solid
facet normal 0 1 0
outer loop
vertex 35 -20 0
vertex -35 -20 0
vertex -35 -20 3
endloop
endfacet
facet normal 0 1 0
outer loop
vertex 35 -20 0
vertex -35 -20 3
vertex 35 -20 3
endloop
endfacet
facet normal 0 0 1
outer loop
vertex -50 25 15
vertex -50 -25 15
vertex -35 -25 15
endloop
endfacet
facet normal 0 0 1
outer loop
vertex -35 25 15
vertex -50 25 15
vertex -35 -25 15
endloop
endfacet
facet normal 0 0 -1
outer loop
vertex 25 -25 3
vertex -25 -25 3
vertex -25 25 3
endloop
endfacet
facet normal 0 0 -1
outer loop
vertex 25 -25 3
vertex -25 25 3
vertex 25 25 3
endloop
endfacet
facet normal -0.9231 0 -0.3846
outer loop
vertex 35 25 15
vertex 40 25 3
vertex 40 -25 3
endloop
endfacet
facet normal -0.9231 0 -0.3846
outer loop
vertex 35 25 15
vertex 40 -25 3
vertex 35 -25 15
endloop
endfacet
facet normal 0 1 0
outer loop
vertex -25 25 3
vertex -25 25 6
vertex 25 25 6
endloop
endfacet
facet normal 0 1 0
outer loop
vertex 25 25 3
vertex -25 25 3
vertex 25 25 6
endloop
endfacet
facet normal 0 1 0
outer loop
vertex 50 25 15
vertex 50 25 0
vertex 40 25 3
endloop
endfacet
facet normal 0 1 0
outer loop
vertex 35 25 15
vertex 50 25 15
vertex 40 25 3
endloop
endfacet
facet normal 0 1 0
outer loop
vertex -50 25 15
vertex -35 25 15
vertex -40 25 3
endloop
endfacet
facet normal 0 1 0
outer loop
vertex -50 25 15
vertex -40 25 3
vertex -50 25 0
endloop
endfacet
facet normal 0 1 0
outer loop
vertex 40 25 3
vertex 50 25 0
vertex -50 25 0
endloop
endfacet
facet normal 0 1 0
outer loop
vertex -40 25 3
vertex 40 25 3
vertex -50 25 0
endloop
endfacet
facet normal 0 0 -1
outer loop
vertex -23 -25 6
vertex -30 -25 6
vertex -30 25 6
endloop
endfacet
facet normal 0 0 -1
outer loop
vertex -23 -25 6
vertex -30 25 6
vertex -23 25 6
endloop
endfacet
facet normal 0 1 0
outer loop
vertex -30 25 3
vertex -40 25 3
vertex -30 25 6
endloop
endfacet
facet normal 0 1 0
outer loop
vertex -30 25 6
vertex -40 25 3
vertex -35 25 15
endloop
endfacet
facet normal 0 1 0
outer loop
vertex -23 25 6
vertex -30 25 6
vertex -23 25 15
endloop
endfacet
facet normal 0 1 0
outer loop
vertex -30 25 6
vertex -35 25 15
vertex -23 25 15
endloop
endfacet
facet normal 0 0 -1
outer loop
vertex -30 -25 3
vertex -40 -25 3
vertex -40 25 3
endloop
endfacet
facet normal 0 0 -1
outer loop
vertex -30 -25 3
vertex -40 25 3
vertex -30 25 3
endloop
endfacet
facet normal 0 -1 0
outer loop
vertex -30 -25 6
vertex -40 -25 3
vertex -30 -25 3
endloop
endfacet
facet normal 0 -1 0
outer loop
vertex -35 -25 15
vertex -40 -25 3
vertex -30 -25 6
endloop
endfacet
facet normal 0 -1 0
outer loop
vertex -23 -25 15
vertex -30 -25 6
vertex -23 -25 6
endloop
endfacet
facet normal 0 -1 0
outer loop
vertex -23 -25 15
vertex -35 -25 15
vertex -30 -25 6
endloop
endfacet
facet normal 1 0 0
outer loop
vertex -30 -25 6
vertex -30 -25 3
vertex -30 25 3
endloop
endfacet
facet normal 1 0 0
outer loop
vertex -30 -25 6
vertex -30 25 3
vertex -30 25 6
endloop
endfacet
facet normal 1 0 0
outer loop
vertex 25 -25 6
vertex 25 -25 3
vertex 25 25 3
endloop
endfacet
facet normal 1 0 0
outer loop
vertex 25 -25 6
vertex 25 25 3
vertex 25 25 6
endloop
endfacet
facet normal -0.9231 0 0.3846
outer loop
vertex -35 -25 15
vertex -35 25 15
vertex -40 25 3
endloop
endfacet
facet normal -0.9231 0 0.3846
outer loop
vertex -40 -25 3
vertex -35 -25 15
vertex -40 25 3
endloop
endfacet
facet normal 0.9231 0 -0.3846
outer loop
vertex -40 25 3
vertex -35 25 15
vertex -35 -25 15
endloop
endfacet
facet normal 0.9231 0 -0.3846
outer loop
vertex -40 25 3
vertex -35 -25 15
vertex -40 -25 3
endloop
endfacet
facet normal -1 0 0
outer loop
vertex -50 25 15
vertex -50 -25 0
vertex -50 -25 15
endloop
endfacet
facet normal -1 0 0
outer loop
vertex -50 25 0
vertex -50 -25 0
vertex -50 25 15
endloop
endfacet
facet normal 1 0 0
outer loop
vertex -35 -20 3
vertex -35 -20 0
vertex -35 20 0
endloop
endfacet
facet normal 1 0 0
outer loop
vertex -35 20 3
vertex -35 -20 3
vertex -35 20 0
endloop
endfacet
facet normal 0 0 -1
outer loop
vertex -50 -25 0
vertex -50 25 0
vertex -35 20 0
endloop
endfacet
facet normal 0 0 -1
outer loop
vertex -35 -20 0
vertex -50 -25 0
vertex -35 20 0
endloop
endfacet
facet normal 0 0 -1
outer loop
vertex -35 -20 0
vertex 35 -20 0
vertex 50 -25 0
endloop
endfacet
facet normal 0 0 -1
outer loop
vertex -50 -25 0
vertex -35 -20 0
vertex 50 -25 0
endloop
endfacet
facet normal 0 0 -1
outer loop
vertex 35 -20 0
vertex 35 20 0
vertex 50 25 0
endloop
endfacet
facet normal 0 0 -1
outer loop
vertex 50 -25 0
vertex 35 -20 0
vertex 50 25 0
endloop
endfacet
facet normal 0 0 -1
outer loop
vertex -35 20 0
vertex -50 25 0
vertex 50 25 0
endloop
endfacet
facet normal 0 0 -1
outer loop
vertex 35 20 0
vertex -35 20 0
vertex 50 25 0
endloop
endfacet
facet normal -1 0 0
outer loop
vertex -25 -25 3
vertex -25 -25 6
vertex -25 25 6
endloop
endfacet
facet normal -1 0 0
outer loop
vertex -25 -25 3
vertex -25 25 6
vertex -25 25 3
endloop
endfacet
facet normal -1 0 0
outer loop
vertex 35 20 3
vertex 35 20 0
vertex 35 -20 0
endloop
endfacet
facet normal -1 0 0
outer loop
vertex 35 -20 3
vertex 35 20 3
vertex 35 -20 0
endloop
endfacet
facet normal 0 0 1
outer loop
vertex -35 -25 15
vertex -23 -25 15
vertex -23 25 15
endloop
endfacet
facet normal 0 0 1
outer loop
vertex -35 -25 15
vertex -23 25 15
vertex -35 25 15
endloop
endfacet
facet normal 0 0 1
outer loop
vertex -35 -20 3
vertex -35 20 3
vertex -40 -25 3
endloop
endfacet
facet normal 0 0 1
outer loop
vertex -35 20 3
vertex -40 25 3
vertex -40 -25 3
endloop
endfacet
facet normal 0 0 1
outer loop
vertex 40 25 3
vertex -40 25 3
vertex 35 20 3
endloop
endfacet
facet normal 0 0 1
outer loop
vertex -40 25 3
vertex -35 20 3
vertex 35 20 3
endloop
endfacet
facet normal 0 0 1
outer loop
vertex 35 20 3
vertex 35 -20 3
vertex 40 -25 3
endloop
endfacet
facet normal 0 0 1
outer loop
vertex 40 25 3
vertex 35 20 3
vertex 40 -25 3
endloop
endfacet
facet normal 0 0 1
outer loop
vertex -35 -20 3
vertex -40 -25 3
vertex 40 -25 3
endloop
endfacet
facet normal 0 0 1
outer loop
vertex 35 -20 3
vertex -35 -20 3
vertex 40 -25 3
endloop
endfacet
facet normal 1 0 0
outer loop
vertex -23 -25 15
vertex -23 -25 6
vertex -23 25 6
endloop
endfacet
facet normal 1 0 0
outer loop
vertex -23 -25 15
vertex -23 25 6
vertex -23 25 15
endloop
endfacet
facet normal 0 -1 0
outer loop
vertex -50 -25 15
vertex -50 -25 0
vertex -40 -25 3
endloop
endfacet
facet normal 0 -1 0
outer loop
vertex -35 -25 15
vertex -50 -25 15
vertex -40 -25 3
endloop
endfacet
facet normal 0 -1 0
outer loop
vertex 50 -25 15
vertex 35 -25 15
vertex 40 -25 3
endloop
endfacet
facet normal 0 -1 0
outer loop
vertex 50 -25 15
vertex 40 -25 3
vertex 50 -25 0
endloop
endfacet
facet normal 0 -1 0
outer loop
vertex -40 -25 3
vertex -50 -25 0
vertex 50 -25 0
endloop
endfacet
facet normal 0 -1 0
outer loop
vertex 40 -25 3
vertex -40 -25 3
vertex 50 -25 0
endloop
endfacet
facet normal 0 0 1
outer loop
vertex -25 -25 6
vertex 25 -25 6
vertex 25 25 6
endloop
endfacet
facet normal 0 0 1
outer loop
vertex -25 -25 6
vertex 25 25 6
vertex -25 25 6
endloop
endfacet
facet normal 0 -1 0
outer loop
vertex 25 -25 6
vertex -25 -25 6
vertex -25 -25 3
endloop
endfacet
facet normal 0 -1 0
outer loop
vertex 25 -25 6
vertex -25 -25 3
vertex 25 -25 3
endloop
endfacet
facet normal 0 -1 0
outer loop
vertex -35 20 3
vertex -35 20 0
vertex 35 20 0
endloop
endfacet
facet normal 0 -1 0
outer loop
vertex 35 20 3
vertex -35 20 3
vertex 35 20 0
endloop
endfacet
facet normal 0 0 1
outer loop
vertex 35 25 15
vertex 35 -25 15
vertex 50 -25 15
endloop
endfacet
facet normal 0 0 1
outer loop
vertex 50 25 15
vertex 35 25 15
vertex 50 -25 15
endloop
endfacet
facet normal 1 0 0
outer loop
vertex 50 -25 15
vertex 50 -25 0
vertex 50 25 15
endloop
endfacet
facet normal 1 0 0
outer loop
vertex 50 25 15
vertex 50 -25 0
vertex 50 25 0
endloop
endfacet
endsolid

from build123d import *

# Parameters (mm, degrees)
F0_W     = 70
F0_H     = 5
F1_DEPTH = 3
F0_W_2   = 10
F0_H_2   = 50
F2_DEPTH = 15
F4_DEPTH = 50.001
F6_DEPTH = 50
F7_DEPTH = 50


with BuildPart() as f1:
    # F0 (on Top) → F1 (new body)
    with BuildSketch(Plane.XY):
        with Locations((0, -22.5)):
            Rectangle(F0_W, F0_H)
        Polygon((-40, -25), (-35, -25), (-35, -20), (-35, 20), (-35, 25), (-40, 25), align=None)
        with Locations((0, 22.5)):
            Rectangle(F0_W, F0_H)
        Polygon((35, -25), (40, -25), (40, 25), (35, 25), (35, 20), (35, -20), align=None)
    extrude(amount=F1_DEPTH)

    # F0 (on Top) → F2 (join)
    with BuildSketch(Plane.XY):
        Polygon((-40, -25), (-35, -25), (-35, -20), (-35, 20), (-35, 25), (-40, 25), align=None)
        with Locations((-45, 0)):
            Rectangle(F0_W_2, F0_H_2)
        Polygon((35, -25), (40, -25), (40, 25), (35, 25), (35, 20), (35, -20), align=None)
        with Locations((45, 0)):
            Rectangle(F0_W_2, F0_H_2)
    extrude(amount=F2_DEPTH)

    # F3 (on face) → F4 (cut, through all)
    with BuildSketch(Plane.XZ.offset(25)):
        Polygon((-35, 3), (-35, 15), (-40, 3), align=None)
        Polygon((35, 15), (35, 3), (40, 3), align=None)
    extrude(amount=-F4_DEPTH, mode=Mode.SUBTRACT)


with BuildPart() as f6:
    # F5 (on face) → F6 (new body, through all)
    with BuildSketch(Plane.XZ.offset(25)):
        Polygon((25, 6), (-23, 6), (-25, 6), (-25, 3), (25, 3), align=None)
    extrude(amount=-F6_DEPTH)


with BuildPart() as f7:
    # F5 (on face) → F7 (new body, through all)
    with BuildSketch(Plane.XZ.offset(25)):
        Polygon((-23, 15), (-35, 15), (-40, 3), (-30, 3), (-30, 6), (-25, 6), (-23, 6), align=None)
    extrude(amount=-F7_DEPTH)


solid = Compound([f1.part, f6.part, f7.part])
